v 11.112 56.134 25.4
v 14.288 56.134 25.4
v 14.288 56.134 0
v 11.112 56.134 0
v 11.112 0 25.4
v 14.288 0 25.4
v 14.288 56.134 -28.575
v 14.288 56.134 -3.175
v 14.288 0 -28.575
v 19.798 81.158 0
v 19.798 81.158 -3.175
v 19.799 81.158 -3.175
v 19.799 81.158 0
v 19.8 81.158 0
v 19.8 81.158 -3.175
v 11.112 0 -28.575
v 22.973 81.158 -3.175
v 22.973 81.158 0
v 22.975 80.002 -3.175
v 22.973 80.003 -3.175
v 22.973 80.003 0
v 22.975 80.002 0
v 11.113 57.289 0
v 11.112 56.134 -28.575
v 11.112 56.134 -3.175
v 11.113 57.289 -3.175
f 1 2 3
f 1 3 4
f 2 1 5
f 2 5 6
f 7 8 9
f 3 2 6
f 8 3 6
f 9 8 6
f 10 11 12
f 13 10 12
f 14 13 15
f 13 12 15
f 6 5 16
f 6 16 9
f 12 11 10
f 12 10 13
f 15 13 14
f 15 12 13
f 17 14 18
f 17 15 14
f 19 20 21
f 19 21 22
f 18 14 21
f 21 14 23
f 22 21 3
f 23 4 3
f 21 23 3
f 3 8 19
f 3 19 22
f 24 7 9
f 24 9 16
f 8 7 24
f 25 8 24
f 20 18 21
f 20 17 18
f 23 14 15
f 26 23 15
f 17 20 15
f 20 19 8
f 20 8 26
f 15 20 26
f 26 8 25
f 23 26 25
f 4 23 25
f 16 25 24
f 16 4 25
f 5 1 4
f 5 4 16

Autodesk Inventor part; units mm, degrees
ref_plane "YZ Plane" through (0, 0, 0) normal (1, 0, 0) x (0, 1, 0)
ref_plane "XZ Plane" through (0, 0, 0) normal (0, 1, 0) x (-1, 0, 0)
ref_plane "XY Plane" through (0, 0, 0) normal (0, 0, 1) x (1, 0, 0)
sketch "Sketch1" plane through (0, 0, 0) normal (1, 0, 0) x (0, 1, 0)
  line L0 (0, 0) -> (56.134, 0)
  line L1 (56.134, 0) -> (56.134, -3.175)
  line L2 (56.134, -3.175) -> (0, -3.175)
  line L3 (0, -3.175) -> (0, 0)
  dimension "d0" = 56.134
  dimension "d1" = 3.175
extrude "Extrusion1" add sketch "Sketch1" along normal blind 25.4
sketch "Sketch2" plane through (0, 56.134, 0) normal (0, 1, 0) x (1, 0, 0)
  line L0 (0, 3.175) -> (25.4, 3.175) projected
  line L1 (11.1125, 3.175) -> (11.1125, 0)
  line L2 (14.2875, 0) -> (14.2875, 3.175)
  line L3 (11.1125, 3.175) -> (14.2875, 3.175)
  line L4 (14.2875, 0) -> (11.1125, 0)
  line L5 (0, 3.175) -> (25.4, 3.175) projected
  line L6 (0, 0) -> (0, 3.175) projected
  line L7 (0, 0) -> (25.4, 0) projected
  line L8 (25.4, 3.175) -> (25.4, 0) projected
  line L9 (0, 3.175) -> (25.4, 3.175) projected
  line L10 (14.2875, 0) -> (11.1125, 0)
sketch "Sketch3" plane through (0, 0, 0) normal (0, 0, 1) x (1, 0, 0)
  line L0 (14.2875, 56.134) -> (11.1125, 57.2894)
  line L1 (11.1125, 57.2894) -> (11.1125, 56.134)
  line L2 (0, 56.134) -> (25.4, 56.134) projected
  point P0 (0, 0)
extrude "Extrusion2" add sketch "Sketch3" against normal blind 3.175
sketch "Sketch4" plane through (14.2875, 56.134, 0) normal (0.341963, 0.9397134, 0) x (0.9397134, -0.341963, 0)
  line L0 (0, 3.175) -> (0, 0) projected
  line L1 (-3.3787, 0) -> (-3.3787, 3.175) projected
  line L2 (0, 3.175) -> (-3.3787, 3.175)
  line L3 (-3.3787, 3.175) -> (-3.3787, 0)
  line L4 (-3.3787, 0) -> (0, 0)
  line L5 (0, 0) -> (0, 3.175)
  point P0 (5.7696, 0)
extrude "Extrusion3" add sketch "Sketch4" along normal blind 25.4
sketch "Sketch5" plane through (22.9734, 80.0027, 0) normal (0.341963, 0.9397134, 0) x (0.9397134, -0.341963, 0)
  point P0 (5.7696, 0)
sketch "Sketch6" plane through (0, 0, -3.175) normal (0, 0, -1) x (-1, 0, 0)
  line L0 (-19.7984, 81.1581) -> (-22.9734, 80.0027) projected
  line L1 (-19.7984, 81.1581) -> (-22.9734, 81.1581)
  line L2 (-22.9734, 81.1581) -> (-22.9734, 80.0027)
  point P0 (0, 0)
extrude "Extrusion4" add sketch "Sketch6" against normal blind 3.175
sketch "Sketch7" plane through (0, 0, 0) normal (0, 0, 1) x (1, 0, 0)
  line L0 (0, 56.134) -> (11.1125, 56.134) projected
  line L1 (11.1125, 56.134) -> (11.1125, 0)
  line L2 (0, 0) -> (25.4, 0) projected
  line L3 (11.1125, 0) -> (0, 0)
  line L4 (0, 0) -> (0, 56.134) projected
  line L5 (0, 0) -> (0, 56.134)
  line L6 (14.2875, 56.134) -> (25.4, 56.134) projected
  line L7 (14.2875, 56.134) -> (14.2875, 0)
  line L8 (25.4, 56.134) -> (25.4, 0) projected
  line L9 (25.4, 0) -> (25.4, 56.134)
extrude "Extrusion5" cut sketch "Sketch7" against normal blind 25.4
sketch "Sketch8" plane through (11.1125, 0, 0) normal (0, 0, 1) x (1, 0, 0)
  line L0 (3.175, 56.134) -> (11.8609, 80.0027) projected
  line L1 (3.175, 56.134) -> (0, 56.134)
  line L2 (0, 0) -> (0, 57.2894) projected
  line L3 (0, 0) -> (3.175, 0) projected
  line L4 (3.175, 0) -> (0, 0)
  line L5 (3.175, 56.134) -> (3.175, 0)
  point P0 (-11.1125, 0)
extrude "Extrusion6" add sketch "Sketch8" along normal blind 25.4
sketch "Sketch9" plane through (11.1125, 0, -3.175) normal (0, 0, -1) x (-1, 0, 0)
  line L0 (0, 0) -> (-3.175, 0) projected
  line L1 (-3.175, 56.134) -> (-3.175, 0) projected
  line L2 (0, 0) -> (-3.175, 0)
  line L3 (-3.175, 0) -> (-3.175, 56.134)
  line L4 (-3.175, 56.134) -> (0, 56.134)
  line L5 (0, 56.134) -> (0, 0)
  point P0 (11.1125, 0)
extrude "Extrusion7" add sketch "Sketch9" along normal blind 25.4
properties part number "ClawPaddle"
